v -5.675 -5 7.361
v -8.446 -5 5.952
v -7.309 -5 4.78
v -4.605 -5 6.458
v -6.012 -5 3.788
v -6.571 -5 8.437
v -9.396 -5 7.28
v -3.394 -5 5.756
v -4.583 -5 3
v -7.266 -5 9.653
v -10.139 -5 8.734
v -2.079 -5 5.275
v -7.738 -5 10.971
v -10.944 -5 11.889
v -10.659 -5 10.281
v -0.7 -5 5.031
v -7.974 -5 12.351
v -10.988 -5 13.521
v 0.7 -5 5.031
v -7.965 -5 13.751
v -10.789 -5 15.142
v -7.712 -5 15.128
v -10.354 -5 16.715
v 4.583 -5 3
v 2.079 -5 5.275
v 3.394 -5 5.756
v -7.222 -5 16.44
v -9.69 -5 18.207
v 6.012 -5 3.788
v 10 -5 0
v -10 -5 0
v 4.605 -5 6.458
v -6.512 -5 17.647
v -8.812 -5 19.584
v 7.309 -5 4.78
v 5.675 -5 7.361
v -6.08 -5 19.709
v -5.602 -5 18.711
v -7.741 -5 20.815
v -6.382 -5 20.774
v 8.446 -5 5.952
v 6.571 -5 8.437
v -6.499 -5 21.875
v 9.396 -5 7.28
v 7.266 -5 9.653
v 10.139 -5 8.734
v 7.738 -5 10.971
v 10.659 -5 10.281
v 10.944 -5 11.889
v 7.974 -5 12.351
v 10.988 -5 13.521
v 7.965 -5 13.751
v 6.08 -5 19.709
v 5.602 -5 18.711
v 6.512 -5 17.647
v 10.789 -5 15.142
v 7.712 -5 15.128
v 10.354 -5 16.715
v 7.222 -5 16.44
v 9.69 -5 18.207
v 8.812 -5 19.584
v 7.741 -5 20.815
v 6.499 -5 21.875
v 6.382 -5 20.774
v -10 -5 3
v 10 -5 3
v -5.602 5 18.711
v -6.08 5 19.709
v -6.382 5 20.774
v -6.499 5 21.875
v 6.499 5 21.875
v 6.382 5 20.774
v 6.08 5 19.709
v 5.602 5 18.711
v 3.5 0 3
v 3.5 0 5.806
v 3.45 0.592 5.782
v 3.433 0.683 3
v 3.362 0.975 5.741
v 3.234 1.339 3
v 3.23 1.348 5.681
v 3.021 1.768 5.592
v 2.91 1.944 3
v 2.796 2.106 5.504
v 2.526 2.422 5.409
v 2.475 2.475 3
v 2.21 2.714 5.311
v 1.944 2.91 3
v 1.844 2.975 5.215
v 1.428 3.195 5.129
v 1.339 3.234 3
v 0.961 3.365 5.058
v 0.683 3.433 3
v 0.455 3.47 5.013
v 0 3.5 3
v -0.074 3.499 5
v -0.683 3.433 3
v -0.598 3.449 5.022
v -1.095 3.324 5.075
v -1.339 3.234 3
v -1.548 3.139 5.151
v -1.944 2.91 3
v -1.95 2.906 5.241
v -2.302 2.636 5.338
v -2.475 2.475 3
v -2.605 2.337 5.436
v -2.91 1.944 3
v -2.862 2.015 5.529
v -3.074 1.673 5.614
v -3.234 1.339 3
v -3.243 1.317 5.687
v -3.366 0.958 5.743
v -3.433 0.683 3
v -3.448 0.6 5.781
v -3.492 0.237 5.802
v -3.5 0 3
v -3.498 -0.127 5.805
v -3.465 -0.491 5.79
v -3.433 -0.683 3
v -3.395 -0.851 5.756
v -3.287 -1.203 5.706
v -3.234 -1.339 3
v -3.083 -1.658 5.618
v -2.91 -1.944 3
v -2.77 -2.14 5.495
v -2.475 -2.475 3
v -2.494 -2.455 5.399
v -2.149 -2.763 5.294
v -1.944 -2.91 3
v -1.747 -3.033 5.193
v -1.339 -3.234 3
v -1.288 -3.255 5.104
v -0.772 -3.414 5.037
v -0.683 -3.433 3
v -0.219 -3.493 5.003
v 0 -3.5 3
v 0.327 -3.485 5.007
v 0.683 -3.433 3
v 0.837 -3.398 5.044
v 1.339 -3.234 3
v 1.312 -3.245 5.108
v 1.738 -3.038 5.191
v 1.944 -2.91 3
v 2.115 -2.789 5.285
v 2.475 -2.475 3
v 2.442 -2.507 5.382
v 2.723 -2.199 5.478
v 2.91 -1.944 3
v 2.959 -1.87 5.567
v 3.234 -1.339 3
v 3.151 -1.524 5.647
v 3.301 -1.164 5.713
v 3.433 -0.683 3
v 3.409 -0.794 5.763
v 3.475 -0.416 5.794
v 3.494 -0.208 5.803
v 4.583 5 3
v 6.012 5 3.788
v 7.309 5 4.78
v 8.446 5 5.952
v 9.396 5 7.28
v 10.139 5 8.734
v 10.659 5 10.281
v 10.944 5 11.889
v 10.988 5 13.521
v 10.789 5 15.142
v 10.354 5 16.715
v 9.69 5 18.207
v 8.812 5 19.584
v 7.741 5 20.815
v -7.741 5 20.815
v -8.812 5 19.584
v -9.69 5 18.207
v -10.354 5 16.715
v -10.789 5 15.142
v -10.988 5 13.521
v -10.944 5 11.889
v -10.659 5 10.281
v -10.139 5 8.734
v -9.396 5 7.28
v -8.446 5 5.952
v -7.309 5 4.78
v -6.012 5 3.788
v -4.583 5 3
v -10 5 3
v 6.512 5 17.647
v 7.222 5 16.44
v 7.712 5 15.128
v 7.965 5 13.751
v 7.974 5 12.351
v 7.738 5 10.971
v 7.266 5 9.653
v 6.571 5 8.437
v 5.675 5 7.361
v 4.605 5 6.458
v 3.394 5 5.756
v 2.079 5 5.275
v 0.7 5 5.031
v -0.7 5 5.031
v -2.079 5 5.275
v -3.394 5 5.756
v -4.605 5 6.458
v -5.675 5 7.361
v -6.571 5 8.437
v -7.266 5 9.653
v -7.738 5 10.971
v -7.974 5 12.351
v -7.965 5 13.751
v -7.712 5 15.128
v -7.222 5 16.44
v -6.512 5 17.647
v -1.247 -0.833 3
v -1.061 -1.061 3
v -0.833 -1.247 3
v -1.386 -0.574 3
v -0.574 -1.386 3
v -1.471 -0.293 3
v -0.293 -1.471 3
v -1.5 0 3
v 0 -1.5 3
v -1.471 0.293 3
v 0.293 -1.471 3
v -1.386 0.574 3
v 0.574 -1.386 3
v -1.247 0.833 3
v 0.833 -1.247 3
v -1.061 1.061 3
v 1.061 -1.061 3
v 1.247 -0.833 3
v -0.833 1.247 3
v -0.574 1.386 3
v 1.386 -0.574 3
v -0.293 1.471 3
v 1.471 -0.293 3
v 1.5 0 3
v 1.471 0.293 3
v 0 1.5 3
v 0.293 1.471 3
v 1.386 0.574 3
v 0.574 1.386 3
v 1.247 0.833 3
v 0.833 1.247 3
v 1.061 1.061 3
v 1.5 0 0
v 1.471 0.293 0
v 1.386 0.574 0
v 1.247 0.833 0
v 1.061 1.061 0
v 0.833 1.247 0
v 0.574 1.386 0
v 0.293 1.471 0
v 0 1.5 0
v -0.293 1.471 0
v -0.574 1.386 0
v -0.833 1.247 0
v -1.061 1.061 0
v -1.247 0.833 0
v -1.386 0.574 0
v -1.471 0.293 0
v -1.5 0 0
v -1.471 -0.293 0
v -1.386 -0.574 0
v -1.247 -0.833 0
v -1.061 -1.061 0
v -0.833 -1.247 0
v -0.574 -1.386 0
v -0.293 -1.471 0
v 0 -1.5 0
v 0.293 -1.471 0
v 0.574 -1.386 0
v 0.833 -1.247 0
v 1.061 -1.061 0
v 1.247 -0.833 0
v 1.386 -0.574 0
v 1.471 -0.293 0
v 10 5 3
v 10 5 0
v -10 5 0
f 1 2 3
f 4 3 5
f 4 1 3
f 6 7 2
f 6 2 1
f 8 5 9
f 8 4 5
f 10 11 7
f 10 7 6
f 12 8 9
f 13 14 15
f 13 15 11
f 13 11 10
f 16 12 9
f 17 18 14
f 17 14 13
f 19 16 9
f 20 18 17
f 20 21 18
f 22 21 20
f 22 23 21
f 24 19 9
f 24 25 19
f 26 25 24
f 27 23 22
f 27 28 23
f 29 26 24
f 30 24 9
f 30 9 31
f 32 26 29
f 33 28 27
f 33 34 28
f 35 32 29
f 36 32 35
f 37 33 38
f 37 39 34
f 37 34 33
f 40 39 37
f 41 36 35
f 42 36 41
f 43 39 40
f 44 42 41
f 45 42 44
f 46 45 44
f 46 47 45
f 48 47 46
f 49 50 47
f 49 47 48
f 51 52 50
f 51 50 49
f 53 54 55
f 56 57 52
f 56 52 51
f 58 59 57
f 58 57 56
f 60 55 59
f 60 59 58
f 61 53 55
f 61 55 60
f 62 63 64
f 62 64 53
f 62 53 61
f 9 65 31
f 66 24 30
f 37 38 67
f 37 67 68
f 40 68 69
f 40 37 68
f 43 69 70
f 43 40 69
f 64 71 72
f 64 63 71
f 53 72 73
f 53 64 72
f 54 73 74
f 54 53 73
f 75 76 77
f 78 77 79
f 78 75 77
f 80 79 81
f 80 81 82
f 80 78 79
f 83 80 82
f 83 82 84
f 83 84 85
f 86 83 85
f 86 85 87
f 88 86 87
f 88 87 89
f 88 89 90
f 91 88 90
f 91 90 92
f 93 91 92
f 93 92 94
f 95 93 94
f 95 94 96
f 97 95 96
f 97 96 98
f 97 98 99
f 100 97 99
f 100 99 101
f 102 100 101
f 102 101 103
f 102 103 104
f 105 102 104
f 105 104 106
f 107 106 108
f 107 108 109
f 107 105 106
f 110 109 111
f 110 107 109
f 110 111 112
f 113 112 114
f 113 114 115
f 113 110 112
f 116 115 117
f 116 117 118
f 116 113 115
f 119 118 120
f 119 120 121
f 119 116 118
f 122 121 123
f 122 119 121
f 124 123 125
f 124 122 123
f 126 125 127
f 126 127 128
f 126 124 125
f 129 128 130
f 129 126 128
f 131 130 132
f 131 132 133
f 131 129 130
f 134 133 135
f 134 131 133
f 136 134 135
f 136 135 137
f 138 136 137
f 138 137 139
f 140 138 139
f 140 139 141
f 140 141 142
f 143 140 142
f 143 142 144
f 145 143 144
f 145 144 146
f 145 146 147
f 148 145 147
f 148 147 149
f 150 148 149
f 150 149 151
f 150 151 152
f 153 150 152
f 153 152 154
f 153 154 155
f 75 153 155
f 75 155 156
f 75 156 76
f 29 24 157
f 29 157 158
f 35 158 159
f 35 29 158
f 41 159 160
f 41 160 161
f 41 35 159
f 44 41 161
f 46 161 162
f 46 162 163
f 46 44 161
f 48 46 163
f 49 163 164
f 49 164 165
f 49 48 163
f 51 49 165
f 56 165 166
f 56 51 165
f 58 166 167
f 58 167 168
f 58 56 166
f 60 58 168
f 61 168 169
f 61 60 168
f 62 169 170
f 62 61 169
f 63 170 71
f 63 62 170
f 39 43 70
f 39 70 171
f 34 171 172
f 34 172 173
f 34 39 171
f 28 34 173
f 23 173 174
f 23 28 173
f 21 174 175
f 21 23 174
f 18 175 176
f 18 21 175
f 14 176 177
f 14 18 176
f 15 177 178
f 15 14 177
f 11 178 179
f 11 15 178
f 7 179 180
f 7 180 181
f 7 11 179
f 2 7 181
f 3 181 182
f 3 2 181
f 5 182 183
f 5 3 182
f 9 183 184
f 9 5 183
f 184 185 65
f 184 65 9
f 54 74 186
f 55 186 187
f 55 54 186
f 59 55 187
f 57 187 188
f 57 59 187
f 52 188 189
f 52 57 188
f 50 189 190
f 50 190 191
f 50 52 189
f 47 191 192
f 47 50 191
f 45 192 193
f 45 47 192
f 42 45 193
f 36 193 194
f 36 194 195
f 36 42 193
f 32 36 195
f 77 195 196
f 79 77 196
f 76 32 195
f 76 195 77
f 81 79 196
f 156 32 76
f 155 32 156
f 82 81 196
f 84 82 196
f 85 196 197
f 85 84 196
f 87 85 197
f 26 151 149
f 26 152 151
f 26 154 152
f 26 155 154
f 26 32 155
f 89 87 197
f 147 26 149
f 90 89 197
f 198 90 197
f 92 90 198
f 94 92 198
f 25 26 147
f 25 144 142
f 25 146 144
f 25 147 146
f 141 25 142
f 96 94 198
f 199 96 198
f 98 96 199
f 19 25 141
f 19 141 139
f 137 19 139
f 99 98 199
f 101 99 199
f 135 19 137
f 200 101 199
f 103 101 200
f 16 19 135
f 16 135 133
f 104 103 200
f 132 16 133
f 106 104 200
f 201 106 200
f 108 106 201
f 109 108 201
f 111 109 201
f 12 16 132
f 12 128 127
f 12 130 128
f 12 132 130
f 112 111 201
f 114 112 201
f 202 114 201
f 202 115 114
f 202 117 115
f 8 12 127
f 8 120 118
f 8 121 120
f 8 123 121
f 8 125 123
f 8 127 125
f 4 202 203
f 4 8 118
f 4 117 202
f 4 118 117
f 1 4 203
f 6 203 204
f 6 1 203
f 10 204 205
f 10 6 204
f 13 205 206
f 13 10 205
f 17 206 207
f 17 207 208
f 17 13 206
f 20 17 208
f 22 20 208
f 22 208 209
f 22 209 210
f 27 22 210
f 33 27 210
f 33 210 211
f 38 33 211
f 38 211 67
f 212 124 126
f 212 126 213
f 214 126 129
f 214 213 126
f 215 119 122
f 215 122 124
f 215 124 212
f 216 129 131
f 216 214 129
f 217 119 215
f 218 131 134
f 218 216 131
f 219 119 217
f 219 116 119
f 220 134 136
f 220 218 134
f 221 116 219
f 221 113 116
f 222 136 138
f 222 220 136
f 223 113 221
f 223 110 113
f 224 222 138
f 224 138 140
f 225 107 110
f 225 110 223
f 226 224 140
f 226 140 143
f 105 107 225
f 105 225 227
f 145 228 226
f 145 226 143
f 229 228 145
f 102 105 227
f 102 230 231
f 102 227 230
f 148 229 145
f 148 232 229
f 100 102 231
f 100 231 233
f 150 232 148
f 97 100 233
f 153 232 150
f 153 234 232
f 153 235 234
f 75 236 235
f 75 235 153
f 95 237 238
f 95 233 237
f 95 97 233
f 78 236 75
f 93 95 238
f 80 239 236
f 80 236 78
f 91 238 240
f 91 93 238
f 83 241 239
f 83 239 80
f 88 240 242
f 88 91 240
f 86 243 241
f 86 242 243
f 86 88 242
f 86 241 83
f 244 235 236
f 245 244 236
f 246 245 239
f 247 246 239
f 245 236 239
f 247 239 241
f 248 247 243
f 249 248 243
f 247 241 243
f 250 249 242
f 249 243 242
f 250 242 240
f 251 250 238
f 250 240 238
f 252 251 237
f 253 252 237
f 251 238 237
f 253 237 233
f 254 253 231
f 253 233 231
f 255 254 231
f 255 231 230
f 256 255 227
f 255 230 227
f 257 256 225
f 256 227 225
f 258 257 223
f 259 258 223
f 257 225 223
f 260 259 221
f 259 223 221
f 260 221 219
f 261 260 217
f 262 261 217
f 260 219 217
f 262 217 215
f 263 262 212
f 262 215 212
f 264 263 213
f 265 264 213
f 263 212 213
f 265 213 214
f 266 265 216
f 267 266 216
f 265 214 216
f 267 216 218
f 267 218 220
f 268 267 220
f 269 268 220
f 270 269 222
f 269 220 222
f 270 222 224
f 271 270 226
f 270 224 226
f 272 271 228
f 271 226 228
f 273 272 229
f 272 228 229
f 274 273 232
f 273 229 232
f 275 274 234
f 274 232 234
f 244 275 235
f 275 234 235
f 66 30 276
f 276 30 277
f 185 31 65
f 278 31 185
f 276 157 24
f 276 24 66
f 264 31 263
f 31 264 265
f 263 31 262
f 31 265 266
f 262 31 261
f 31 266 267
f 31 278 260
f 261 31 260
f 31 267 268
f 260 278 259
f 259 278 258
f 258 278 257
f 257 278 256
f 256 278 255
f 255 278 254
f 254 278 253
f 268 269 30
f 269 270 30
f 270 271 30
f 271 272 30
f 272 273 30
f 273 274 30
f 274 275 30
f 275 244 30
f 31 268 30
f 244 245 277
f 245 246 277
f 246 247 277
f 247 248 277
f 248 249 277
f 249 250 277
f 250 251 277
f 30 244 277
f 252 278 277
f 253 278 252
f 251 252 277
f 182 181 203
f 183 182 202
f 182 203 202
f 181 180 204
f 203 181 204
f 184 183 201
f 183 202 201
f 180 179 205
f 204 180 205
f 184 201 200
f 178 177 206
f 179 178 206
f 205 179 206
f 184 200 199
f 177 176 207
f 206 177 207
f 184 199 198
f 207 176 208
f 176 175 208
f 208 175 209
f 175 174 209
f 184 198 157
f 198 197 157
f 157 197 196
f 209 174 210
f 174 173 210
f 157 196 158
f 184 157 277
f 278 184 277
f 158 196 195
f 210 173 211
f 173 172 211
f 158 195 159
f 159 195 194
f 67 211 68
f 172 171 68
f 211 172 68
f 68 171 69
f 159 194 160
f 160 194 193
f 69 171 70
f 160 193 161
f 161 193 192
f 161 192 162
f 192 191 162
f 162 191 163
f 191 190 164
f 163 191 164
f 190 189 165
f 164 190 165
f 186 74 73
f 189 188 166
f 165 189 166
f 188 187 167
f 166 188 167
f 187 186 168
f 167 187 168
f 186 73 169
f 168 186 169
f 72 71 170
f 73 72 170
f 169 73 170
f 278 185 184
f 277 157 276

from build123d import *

# Parameters (mm, degrees)
F0_W     = 20
F0_H     = 10
F1_DEPTH = 3
F3_DEPTH = 5
F4_R     = 1.5
F5_DEPTH = 12.5
F6_R     = 3.5
F7_DEPTH = 25


with BuildPart() as f1:
    # F0 (on Top) → F1 (new body)
    with BuildSketch(Plane.XY):
        Rectangle(F0_W, F0_H)
    extrude(amount=F1_DEPTH)

    # F2 (on Front) → F3 (join, symmetric)
    with BuildSketch(Plane.XZ):
        with BuildLine():
            ThreePointArc((5.602103, 18.71108), (0, 5), (-5.602103, 18.71108))
            ThreePointArc((-5.602103, 18.71108), (-6.253786, 20.235457), (-6.498651, 21.875107))
            ThreePointArc((-6.498651, 21.875107), (0, 2), (6.498651, 21.875107))
            ThreePointArc((6.498651, 21.875107), (6.253786, 20.235457), (5.602103, 18.71108))
        make_face()
    extrude(amount=F3_DEPTH, both=True)

    # F4 (on face) → F5 (cut, symmetric)
    with BuildSketch(Plane.XY.offset(3)):
        Circle(F4_R)
    extrude(amount=F5_DEPTH, both=True, mode=Mode.SUBTRACT)

    # F6 (on face) → F7 (cut)
    with BuildSketch(Plane.XY.offset(3)):
        Circle(F6_R)
    extrude(amount=F7_DEPTH, mode=Mode.SUBTRACT)


solid = f1.part
